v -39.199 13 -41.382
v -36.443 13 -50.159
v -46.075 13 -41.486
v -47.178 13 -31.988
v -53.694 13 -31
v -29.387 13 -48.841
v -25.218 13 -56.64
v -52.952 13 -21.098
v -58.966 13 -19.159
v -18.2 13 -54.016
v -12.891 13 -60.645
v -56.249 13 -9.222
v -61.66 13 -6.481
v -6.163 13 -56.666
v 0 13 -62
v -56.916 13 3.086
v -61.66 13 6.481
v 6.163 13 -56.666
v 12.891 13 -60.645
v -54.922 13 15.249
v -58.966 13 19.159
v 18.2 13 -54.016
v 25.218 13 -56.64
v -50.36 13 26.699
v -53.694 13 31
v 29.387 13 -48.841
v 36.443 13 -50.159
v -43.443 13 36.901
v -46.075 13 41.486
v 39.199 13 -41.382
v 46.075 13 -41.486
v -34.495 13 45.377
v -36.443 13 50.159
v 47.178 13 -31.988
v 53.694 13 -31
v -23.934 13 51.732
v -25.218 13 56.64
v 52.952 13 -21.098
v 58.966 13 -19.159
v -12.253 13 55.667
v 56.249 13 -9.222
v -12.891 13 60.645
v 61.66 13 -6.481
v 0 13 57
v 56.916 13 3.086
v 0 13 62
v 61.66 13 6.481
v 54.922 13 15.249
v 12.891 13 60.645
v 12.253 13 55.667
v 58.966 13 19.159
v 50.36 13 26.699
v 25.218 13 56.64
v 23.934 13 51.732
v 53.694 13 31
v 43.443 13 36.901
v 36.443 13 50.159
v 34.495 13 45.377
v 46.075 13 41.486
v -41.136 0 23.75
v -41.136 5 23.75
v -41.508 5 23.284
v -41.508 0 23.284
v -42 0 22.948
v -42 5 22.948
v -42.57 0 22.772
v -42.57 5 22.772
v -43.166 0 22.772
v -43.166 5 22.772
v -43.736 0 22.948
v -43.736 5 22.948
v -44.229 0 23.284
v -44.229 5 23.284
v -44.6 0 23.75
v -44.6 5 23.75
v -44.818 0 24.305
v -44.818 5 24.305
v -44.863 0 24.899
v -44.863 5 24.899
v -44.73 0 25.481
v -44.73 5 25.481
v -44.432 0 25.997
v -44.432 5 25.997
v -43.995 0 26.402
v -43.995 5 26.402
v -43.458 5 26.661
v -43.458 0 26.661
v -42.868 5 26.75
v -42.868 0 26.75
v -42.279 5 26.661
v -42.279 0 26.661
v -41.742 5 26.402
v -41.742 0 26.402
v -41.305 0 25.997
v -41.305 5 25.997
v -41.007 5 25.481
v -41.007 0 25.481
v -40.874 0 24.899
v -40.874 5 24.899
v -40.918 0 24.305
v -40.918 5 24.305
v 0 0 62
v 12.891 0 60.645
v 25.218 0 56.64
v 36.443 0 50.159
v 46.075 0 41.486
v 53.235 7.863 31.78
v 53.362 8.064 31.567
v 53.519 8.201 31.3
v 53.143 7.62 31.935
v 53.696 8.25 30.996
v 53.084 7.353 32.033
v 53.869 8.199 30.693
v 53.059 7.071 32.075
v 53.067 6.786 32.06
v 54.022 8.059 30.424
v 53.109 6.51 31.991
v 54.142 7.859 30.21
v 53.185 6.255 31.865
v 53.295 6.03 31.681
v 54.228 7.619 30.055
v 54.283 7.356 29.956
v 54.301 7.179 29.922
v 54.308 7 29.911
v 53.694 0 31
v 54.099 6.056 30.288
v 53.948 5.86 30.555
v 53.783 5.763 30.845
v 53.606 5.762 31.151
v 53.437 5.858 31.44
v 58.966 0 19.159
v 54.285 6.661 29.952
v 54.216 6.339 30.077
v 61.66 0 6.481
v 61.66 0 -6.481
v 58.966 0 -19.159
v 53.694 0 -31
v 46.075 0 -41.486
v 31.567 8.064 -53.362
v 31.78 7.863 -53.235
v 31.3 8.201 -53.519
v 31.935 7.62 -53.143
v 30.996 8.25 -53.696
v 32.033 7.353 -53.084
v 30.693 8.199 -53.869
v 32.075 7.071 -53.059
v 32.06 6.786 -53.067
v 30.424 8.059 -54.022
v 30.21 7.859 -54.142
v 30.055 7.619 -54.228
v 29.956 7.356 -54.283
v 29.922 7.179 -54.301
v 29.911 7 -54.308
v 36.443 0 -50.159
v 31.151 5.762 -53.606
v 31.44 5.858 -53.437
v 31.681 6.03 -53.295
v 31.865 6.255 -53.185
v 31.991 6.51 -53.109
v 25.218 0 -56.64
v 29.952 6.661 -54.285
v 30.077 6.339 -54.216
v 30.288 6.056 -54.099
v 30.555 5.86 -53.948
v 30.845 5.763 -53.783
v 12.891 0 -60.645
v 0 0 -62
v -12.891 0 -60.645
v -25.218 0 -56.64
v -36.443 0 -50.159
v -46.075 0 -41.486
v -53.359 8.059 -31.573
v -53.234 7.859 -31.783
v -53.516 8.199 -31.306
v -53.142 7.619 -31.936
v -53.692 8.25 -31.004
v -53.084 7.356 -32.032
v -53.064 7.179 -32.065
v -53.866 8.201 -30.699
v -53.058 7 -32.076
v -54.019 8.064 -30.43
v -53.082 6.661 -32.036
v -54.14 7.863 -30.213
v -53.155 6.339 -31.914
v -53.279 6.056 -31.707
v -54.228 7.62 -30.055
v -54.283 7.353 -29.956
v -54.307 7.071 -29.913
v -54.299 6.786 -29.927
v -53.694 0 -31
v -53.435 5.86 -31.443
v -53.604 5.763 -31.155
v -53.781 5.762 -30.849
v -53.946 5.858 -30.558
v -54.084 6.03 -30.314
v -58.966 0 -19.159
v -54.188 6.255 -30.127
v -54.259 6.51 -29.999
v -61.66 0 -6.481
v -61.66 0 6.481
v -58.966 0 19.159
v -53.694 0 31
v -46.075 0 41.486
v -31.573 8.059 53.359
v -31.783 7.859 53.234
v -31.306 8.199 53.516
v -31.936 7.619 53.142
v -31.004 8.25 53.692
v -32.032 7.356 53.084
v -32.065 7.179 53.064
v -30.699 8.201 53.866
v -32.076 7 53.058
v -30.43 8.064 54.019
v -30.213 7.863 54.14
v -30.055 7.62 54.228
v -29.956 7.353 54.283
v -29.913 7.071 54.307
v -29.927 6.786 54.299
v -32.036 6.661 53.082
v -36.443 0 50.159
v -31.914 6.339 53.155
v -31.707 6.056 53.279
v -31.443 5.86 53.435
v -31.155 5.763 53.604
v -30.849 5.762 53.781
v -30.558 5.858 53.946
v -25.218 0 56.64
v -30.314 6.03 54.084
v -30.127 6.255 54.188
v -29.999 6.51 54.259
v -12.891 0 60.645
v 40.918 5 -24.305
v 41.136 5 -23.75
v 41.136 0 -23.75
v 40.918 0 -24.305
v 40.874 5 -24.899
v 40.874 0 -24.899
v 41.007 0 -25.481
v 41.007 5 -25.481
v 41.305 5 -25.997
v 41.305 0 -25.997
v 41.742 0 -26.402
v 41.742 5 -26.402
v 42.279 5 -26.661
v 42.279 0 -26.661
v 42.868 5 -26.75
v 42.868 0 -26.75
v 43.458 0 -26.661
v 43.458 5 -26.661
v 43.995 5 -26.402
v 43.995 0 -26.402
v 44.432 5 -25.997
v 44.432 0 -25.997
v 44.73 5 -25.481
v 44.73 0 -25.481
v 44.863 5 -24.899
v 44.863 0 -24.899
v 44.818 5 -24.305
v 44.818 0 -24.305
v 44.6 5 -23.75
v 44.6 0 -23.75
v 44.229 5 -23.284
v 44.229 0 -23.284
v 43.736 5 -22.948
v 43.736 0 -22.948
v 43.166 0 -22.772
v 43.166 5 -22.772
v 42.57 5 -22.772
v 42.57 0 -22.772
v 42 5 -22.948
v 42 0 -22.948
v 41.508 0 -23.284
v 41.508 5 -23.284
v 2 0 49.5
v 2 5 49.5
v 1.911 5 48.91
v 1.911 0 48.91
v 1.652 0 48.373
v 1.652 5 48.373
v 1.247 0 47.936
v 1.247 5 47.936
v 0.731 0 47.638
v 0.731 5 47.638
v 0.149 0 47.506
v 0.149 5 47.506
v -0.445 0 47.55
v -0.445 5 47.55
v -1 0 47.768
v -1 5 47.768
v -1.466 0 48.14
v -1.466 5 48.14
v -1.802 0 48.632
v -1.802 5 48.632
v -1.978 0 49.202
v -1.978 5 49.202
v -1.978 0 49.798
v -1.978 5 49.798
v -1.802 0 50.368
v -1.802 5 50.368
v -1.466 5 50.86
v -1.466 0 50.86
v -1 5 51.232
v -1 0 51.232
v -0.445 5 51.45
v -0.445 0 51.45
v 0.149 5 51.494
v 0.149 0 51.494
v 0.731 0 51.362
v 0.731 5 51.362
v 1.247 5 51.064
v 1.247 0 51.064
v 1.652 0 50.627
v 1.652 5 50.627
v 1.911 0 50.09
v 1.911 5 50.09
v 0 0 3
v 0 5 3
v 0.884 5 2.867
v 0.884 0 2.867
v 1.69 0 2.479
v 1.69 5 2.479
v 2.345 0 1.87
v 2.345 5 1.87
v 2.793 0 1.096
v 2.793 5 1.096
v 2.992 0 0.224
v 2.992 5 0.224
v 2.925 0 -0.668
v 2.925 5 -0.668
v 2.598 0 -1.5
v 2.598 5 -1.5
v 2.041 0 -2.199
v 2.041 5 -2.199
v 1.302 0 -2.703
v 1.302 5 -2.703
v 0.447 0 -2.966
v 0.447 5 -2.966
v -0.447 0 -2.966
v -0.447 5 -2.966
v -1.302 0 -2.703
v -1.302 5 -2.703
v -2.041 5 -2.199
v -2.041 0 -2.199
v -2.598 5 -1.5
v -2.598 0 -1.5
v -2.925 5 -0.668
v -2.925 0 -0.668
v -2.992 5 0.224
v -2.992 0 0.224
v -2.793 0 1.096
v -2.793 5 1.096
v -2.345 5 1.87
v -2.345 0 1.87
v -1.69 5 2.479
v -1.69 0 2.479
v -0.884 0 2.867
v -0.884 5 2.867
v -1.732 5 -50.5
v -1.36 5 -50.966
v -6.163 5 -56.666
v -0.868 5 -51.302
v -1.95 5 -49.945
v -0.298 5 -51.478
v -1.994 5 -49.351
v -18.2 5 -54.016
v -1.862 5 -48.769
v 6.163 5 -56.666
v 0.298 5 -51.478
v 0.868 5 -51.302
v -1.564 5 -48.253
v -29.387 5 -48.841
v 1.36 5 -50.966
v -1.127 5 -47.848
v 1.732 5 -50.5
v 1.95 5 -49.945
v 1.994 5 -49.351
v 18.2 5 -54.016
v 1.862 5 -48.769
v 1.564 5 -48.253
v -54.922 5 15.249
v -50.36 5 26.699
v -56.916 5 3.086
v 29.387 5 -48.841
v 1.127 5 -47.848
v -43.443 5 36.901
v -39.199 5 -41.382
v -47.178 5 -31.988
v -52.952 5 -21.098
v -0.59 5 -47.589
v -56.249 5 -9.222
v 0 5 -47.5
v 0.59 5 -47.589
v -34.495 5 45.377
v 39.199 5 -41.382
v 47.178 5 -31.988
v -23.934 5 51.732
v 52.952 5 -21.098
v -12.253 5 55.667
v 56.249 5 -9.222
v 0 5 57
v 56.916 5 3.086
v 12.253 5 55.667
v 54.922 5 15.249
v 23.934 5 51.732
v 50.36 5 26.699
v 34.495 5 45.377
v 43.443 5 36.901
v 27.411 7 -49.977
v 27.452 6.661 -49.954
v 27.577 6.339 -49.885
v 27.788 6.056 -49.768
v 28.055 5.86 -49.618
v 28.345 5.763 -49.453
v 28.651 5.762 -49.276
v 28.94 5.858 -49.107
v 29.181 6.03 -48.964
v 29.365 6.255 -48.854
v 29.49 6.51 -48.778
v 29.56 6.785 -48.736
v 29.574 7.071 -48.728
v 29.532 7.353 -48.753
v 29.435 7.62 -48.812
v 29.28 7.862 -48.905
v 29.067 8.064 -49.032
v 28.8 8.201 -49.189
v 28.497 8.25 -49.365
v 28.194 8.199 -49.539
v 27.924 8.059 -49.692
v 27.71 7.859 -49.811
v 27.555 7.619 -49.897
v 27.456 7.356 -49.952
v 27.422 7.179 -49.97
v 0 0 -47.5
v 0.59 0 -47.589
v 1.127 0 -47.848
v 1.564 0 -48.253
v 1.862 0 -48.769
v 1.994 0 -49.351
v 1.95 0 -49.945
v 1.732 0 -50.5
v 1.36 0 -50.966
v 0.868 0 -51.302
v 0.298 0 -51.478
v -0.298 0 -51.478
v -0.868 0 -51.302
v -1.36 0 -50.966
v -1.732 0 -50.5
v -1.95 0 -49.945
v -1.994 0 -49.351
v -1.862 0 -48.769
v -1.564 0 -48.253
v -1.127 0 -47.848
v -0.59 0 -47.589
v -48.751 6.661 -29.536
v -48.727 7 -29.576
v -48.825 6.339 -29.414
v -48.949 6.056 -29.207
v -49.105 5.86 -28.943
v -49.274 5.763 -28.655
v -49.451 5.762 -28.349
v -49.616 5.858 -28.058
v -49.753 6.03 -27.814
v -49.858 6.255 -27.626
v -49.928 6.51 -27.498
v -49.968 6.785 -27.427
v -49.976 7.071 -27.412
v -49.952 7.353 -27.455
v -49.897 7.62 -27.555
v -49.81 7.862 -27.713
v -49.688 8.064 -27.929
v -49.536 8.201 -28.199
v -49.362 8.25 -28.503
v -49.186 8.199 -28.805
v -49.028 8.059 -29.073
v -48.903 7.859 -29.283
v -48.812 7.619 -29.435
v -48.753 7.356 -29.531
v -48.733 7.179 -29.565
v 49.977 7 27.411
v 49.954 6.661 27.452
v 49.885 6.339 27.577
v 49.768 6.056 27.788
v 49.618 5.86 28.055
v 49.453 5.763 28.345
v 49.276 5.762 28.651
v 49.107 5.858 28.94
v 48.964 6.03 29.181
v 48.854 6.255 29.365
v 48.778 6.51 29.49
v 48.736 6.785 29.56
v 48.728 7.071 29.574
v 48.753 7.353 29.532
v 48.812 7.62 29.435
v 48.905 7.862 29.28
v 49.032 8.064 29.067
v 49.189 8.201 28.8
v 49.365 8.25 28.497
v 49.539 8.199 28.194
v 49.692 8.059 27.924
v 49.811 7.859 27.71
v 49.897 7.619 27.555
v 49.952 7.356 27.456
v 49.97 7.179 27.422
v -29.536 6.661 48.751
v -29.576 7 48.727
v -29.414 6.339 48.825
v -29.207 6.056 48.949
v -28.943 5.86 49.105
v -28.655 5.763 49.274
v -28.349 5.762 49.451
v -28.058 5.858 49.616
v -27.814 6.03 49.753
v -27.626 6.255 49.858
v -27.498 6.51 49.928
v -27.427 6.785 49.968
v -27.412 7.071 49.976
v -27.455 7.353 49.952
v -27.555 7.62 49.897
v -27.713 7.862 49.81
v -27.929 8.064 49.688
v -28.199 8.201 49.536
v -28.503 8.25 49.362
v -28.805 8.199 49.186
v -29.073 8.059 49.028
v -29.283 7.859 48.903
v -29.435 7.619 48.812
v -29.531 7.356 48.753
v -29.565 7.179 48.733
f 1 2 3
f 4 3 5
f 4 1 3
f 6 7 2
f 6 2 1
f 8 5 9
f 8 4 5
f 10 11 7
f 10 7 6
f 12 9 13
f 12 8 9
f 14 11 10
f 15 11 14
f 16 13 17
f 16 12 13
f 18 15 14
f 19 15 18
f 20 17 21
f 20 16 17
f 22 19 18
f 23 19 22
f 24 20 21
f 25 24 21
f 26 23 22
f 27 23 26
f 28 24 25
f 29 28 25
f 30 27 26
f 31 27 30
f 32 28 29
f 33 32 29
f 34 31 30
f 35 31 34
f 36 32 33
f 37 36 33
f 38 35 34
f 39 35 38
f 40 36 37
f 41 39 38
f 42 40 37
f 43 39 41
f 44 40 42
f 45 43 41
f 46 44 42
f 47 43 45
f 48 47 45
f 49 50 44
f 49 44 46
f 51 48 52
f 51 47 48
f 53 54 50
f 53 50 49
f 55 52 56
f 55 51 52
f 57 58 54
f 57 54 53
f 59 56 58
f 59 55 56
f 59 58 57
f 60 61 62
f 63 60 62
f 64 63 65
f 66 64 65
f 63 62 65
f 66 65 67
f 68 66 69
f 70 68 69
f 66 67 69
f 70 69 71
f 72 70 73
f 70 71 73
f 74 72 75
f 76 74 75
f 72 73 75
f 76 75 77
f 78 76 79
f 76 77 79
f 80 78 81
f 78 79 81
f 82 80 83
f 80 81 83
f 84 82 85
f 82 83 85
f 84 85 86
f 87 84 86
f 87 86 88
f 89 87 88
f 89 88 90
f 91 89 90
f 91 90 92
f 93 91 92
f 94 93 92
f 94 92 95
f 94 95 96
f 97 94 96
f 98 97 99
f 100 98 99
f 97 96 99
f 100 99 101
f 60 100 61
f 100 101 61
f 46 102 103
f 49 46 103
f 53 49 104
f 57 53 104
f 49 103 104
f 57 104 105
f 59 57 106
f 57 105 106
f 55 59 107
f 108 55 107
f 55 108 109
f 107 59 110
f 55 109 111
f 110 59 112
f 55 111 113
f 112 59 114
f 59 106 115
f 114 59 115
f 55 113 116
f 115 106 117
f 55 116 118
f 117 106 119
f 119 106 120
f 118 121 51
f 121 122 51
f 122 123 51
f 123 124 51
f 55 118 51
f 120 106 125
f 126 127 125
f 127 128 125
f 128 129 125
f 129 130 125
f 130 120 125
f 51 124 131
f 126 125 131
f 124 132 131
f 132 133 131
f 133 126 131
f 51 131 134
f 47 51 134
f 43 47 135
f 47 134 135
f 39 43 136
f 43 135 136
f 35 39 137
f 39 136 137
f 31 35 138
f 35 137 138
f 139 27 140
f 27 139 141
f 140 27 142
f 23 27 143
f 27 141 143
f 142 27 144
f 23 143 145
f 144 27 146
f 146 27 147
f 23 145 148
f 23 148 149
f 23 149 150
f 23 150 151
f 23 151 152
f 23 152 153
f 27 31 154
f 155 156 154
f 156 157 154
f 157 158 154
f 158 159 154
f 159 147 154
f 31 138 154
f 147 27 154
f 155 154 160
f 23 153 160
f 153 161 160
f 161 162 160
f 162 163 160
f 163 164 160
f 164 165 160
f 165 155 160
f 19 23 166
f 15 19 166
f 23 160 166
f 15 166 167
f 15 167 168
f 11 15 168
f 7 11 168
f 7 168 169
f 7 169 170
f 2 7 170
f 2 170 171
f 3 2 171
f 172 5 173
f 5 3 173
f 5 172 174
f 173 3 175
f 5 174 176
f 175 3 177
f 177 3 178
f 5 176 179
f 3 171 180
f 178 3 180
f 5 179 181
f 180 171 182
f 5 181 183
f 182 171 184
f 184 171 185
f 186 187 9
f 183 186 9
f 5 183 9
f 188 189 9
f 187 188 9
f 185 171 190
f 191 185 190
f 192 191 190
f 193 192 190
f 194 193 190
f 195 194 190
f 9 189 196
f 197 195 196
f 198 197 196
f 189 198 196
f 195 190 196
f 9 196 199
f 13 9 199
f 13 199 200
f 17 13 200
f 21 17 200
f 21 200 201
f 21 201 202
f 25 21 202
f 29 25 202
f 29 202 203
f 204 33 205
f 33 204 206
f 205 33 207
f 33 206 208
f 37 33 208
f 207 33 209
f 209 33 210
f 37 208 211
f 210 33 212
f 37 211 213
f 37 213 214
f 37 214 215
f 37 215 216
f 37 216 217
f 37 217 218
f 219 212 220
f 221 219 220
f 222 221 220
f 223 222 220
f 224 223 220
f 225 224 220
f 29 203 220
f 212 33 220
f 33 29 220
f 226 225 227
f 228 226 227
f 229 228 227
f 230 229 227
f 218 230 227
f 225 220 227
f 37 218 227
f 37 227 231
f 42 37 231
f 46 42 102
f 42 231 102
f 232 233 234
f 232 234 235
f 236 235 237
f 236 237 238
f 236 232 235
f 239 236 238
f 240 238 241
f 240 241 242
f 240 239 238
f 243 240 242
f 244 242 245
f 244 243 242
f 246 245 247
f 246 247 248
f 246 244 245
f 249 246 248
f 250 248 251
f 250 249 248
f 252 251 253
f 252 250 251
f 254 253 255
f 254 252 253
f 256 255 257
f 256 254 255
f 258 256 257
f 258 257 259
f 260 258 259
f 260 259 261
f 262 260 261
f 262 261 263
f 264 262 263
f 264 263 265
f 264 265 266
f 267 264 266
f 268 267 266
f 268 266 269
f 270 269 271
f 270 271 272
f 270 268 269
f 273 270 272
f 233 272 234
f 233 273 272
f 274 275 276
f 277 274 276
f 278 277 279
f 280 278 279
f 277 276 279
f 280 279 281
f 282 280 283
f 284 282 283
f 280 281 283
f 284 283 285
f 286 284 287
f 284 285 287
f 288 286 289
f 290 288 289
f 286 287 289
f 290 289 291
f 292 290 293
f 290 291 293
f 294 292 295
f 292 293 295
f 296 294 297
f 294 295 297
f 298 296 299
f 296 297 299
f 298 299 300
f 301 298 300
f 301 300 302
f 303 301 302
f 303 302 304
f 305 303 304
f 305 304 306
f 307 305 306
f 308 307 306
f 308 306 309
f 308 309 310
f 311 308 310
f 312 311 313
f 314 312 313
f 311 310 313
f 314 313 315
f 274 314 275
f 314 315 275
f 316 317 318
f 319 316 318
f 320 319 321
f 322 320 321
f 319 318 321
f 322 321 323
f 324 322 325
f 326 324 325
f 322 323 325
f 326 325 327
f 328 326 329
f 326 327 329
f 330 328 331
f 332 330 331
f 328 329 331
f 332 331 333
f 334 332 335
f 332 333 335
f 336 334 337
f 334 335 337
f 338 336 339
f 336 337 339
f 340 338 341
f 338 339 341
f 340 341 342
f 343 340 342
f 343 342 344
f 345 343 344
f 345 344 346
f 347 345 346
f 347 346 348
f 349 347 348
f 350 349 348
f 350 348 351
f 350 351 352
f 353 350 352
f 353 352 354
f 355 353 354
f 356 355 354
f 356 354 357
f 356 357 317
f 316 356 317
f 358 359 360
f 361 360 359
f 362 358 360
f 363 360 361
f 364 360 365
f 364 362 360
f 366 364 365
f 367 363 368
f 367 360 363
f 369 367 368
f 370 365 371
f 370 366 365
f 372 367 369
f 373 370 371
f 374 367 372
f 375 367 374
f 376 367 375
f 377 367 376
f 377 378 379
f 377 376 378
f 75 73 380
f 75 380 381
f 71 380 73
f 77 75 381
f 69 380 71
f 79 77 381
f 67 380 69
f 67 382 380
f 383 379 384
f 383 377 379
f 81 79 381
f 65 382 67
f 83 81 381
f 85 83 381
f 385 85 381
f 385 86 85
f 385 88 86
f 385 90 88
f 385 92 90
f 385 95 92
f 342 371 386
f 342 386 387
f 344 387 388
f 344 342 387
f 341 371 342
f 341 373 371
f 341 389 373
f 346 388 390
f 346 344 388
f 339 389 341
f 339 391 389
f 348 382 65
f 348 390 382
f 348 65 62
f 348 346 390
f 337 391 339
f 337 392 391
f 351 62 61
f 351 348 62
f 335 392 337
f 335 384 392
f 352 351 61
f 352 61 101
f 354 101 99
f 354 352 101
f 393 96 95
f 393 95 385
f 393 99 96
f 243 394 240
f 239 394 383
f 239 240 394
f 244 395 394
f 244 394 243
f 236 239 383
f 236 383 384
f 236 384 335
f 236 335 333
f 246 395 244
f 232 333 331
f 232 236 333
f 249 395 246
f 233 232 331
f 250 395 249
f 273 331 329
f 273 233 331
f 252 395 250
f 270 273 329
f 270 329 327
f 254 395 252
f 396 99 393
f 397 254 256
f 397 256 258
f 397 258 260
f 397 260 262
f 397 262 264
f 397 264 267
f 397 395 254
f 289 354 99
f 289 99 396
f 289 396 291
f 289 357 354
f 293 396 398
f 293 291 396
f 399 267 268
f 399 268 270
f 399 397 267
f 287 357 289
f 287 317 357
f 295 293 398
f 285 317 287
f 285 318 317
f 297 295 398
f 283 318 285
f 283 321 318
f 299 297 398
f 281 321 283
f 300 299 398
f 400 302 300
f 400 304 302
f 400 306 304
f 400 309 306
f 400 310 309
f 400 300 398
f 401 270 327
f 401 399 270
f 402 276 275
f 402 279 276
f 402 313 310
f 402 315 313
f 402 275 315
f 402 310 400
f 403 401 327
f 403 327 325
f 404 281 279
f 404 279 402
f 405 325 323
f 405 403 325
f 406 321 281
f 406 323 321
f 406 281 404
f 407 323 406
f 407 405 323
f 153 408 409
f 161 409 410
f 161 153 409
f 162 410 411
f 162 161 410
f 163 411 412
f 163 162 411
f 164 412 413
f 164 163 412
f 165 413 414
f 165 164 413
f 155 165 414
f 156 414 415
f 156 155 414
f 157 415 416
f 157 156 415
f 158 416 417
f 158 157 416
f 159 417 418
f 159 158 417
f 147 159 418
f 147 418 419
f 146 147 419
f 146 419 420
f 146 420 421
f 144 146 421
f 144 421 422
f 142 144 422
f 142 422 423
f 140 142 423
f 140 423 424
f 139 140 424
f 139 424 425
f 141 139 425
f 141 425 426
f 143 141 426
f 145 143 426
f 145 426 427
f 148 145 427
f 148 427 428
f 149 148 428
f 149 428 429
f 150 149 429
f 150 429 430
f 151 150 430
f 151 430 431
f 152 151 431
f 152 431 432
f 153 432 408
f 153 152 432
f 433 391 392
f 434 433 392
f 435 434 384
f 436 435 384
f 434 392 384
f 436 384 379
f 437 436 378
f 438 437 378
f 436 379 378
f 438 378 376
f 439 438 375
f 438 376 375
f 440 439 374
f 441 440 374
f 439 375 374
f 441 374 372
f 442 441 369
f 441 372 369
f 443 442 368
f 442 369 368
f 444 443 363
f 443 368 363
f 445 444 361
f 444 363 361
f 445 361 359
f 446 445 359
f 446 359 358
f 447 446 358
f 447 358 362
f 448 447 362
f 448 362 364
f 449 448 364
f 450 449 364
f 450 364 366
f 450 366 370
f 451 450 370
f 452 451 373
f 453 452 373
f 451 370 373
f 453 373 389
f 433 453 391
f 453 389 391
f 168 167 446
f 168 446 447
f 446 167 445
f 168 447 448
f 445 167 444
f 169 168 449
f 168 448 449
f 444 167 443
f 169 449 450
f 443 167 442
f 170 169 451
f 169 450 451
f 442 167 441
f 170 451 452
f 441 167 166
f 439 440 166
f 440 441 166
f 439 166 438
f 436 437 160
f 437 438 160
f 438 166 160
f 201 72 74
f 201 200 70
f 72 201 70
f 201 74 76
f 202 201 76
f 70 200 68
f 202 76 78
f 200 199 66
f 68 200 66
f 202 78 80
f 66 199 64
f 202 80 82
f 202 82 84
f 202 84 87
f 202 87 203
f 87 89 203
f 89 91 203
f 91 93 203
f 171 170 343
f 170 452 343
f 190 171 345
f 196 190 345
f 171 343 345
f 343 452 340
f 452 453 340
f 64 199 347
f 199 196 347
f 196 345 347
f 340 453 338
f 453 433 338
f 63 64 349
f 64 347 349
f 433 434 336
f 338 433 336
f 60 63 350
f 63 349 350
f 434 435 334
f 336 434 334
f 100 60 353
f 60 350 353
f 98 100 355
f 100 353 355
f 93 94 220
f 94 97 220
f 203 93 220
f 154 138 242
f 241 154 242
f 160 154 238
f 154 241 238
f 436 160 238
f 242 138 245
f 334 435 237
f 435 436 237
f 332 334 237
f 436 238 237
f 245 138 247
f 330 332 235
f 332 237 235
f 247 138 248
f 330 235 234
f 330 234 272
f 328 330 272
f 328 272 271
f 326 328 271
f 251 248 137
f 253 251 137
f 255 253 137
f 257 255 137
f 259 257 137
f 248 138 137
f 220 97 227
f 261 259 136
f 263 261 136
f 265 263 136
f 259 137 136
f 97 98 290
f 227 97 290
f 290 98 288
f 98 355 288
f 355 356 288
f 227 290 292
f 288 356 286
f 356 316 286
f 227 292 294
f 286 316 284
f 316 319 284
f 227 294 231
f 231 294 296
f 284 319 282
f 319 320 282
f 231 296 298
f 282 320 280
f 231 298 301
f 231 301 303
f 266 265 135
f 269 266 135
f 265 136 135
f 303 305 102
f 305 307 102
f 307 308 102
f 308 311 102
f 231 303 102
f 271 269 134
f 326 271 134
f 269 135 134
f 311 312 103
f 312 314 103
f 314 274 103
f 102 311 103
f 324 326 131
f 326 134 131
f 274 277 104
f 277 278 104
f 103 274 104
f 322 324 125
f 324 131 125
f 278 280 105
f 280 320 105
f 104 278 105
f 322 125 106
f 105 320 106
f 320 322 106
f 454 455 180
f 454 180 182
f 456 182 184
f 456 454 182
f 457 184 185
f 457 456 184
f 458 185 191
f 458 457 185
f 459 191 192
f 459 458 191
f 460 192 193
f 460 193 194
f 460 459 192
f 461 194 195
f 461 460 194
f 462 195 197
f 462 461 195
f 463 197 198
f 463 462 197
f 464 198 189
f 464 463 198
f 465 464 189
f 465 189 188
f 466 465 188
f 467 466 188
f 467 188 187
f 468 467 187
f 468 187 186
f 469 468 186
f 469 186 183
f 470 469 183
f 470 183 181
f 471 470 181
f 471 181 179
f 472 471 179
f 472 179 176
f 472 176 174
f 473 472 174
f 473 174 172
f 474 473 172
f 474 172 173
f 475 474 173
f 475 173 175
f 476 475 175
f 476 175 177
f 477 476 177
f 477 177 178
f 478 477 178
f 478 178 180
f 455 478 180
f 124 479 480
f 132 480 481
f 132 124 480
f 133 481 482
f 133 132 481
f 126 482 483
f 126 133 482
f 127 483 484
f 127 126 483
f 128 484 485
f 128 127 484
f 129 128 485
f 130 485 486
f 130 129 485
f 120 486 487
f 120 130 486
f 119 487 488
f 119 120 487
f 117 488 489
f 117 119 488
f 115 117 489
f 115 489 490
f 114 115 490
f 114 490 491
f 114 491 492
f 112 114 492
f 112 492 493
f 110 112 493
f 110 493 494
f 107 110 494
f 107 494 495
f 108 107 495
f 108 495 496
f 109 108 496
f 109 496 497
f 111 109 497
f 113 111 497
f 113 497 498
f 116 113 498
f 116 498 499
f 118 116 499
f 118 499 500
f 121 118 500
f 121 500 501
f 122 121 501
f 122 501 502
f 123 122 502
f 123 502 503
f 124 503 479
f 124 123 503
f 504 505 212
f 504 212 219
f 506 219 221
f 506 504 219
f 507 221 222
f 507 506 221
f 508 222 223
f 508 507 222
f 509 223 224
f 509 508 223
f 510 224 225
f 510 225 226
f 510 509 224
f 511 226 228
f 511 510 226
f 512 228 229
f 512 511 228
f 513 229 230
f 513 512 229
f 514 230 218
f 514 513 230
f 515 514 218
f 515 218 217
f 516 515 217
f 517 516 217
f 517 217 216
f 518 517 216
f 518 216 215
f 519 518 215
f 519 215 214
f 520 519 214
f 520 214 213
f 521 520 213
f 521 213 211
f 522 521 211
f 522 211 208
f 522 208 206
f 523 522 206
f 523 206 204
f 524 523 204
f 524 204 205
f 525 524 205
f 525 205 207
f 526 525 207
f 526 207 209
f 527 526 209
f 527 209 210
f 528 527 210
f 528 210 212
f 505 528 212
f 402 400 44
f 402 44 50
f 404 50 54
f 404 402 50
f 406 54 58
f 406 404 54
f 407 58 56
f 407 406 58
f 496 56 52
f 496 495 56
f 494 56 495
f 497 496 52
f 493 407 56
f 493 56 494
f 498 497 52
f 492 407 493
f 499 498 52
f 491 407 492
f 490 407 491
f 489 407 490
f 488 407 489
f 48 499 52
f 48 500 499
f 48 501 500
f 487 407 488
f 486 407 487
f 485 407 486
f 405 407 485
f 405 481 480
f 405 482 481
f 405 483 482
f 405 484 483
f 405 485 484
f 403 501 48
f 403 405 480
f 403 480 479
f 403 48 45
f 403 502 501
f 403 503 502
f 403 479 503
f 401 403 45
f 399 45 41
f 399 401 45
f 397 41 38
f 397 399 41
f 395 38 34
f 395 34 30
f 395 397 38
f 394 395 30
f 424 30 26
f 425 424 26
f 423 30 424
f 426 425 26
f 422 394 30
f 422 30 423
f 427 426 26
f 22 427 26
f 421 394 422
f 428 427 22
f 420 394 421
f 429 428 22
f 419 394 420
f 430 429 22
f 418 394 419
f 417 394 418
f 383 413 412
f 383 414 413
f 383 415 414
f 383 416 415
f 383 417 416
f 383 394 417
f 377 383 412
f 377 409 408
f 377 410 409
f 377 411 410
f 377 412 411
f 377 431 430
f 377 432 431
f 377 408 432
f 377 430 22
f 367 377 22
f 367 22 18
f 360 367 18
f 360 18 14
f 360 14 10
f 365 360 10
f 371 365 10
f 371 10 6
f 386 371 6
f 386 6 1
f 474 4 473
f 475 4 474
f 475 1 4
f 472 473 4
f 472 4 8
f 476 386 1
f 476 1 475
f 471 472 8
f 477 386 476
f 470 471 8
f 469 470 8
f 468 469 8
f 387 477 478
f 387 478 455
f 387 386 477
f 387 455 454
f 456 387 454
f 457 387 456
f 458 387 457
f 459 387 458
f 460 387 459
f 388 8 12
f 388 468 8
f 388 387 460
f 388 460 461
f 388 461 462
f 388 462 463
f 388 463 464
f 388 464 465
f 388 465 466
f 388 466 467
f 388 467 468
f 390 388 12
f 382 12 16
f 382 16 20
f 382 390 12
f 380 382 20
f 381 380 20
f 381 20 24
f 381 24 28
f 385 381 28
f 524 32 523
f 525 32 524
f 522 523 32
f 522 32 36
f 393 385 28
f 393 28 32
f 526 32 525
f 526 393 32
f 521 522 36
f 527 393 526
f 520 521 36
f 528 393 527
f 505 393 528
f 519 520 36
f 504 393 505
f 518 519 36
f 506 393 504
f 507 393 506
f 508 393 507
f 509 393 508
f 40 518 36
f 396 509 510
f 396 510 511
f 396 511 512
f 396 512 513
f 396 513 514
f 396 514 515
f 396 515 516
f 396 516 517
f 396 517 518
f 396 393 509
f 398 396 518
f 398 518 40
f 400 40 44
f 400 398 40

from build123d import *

# Parameters (mm, degrees)
SKETCH1_R               = 62
BOSS_EXTRUDE1_DEPTH     = 5
SKETCH2_R               = 2
CUT_EXTRUDE1_DEPTH      = 5
CIRPATTERN1_COUNT       = 2
CIRPATTERN1_ANGLE       = 120
MIRROR1_COPY_1_SKETCH_R = 2
MIRROR1_COPY_1_DEPTH    = 5
SKETCH5_R               = 62
SKETCH5_R_2             = 57
BOSS_EXTRUDE2_DEPTH     = 8
CUT_EXTRUDE2_START      = -90
SKETCH6_R               = 1.25
CUT_EXTRUDE2_DEPTH      = 192
CIRPATTERN2_COUNT       = 2
CIRPATTERN2_ANGLE       = 90
SKETCH7_R               = 3
CUT_EXTRUDE3_DEPTH      = 10


with BuildPart() as part:
    # Sketch1 → Boss-Extrude1 (new body)
    with BuildSketch(Plane(origin=(0, 0, 0), x_dir=(1, 0, 0), z_dir=(0, 1, 0))):
        with Locations(Location((0, 0, 0), (0, 0, 270))):
            Circle(SKETCH1_R)
    extrude(amount=BOSS_EXTRUDE1_DEPTH)

    # Sketch2 → Cut-Extrude1 (cut)
    with BuildSketch(Plane(origin=(0, 5, 0), x_dir=(1, 0, 0), z_dir=(0, 1, 0))):
        with Locations(Location((0, 49.5, 0), (0, 0, 270))):
            Circle(SKETCH2_R)
    cut_extrude1 = extrude(amount=-CUT_EXTRUDE1_DEPTH, mode=Mode.SUBTRACT)

    # CirPattern1: Cut-Extrude1 ×2 about axis
    cirpattern1_axis = Axis((0, 5, 0), (0, 1, 0))
    for i in range(1, CIRPATTERN1_COUNT):
        add(cut_extrude1.rotate(cirpattern1_axis, i * CIRPATTERN1_ANGLE / (CIRPATTERN1_COUNT - 1)), mode=Mode.SUBTRACT)

    # Mirror1: Cut-Extrude1 across plane
    add(cut_extrude1.mirror(Plane(origin=(0, 0, 0), x_dir=(-0.49999999999999806, 0, 0.8660254037844398), z_dir=(-0.8660254037844398, 0, -0.49999999999999806))), mode=Mode.SUBTRACT)

    # Mirror1 copy 1 sketch → Mirror1 copy 1 (cut)
    with BuildSketch(Plane(origin=(0, 5, 0), x_dir=(1, 0, 0), z_dir=(0, 1, 0))):
        with Locations((0, -49.5)):
            Circle(MIRROR1_COPY_1_SKETCH_R)
    extrude(amount=-MIRROR1_COPY_1_DEPTH, mode=Mode.SUBTRACT)

    # Sketch5 → Boss-Extrude2 (add)
    with BuildSketch(Plane(origin=(0, 5, 0), x_dir=(1, 0, 0), z_dir=(0, 1, 0))):
        with Locations(Location((0, 0, 0), (0, 0, 270))):
            Circle(SKETCH5_R)
        with Locations(Location((0, 0, 0), (0, 0, 270))):
            Circle(SKETCH5_R_2, mode=Mode.SUBTRACT)
    extrude(amount=BOSS_EXTRUDE2_DEPTH)

    # Sketch6 → Cut-Extrude2 (cut)
    with BuildSketch(Plane(origin=(0, 0, 0), x_dir=(-0.49999999999999806, 0, 0.8660254037844398), z_dir=(-0.8660254037844398, 0, -0.49999999999999806)).offset(CUT_EXTRUDE2_START)):
        with Locations(Location((0, 7, 0), (0, 0, 180))):
            Circle(SKETCH6_R)
    cut_extrude2 = extrude(amount=CUT_EXTRUDE2_DEPTH, mode=Mode.SUBTRACT)

    # CirPattern2: Cut-Extrude2 ×2 about axis
    cirpattern2_axis = Axis((0, 13, 0), (0, 1, 0))
    for i in range(1, CIRPATTERN2_COUNT):
        add(cut_extrude2.rotate(cirpattern2_axis, i * CIRPATTERN2_ANGLE / (CIRPATTERN2_COUNT - 1)), mode=Mode.SUBTRACT)

    # Sketch7 → Cut-Extrude3 (cut)
    with BuildSketch(Plane(origin=(0, 5, 0), x_dir=(1, 0, 0), z_dir=(0, 1, 0))):
        with Locations(Location((0, 0, 0), (0, 0, 270))):
            Circle(SKETCH7_R)
    extrude(amount=-CUT_EXTRUDE3_DEPTH, mode=Mode.SUBTRACT)


solid = part.part
